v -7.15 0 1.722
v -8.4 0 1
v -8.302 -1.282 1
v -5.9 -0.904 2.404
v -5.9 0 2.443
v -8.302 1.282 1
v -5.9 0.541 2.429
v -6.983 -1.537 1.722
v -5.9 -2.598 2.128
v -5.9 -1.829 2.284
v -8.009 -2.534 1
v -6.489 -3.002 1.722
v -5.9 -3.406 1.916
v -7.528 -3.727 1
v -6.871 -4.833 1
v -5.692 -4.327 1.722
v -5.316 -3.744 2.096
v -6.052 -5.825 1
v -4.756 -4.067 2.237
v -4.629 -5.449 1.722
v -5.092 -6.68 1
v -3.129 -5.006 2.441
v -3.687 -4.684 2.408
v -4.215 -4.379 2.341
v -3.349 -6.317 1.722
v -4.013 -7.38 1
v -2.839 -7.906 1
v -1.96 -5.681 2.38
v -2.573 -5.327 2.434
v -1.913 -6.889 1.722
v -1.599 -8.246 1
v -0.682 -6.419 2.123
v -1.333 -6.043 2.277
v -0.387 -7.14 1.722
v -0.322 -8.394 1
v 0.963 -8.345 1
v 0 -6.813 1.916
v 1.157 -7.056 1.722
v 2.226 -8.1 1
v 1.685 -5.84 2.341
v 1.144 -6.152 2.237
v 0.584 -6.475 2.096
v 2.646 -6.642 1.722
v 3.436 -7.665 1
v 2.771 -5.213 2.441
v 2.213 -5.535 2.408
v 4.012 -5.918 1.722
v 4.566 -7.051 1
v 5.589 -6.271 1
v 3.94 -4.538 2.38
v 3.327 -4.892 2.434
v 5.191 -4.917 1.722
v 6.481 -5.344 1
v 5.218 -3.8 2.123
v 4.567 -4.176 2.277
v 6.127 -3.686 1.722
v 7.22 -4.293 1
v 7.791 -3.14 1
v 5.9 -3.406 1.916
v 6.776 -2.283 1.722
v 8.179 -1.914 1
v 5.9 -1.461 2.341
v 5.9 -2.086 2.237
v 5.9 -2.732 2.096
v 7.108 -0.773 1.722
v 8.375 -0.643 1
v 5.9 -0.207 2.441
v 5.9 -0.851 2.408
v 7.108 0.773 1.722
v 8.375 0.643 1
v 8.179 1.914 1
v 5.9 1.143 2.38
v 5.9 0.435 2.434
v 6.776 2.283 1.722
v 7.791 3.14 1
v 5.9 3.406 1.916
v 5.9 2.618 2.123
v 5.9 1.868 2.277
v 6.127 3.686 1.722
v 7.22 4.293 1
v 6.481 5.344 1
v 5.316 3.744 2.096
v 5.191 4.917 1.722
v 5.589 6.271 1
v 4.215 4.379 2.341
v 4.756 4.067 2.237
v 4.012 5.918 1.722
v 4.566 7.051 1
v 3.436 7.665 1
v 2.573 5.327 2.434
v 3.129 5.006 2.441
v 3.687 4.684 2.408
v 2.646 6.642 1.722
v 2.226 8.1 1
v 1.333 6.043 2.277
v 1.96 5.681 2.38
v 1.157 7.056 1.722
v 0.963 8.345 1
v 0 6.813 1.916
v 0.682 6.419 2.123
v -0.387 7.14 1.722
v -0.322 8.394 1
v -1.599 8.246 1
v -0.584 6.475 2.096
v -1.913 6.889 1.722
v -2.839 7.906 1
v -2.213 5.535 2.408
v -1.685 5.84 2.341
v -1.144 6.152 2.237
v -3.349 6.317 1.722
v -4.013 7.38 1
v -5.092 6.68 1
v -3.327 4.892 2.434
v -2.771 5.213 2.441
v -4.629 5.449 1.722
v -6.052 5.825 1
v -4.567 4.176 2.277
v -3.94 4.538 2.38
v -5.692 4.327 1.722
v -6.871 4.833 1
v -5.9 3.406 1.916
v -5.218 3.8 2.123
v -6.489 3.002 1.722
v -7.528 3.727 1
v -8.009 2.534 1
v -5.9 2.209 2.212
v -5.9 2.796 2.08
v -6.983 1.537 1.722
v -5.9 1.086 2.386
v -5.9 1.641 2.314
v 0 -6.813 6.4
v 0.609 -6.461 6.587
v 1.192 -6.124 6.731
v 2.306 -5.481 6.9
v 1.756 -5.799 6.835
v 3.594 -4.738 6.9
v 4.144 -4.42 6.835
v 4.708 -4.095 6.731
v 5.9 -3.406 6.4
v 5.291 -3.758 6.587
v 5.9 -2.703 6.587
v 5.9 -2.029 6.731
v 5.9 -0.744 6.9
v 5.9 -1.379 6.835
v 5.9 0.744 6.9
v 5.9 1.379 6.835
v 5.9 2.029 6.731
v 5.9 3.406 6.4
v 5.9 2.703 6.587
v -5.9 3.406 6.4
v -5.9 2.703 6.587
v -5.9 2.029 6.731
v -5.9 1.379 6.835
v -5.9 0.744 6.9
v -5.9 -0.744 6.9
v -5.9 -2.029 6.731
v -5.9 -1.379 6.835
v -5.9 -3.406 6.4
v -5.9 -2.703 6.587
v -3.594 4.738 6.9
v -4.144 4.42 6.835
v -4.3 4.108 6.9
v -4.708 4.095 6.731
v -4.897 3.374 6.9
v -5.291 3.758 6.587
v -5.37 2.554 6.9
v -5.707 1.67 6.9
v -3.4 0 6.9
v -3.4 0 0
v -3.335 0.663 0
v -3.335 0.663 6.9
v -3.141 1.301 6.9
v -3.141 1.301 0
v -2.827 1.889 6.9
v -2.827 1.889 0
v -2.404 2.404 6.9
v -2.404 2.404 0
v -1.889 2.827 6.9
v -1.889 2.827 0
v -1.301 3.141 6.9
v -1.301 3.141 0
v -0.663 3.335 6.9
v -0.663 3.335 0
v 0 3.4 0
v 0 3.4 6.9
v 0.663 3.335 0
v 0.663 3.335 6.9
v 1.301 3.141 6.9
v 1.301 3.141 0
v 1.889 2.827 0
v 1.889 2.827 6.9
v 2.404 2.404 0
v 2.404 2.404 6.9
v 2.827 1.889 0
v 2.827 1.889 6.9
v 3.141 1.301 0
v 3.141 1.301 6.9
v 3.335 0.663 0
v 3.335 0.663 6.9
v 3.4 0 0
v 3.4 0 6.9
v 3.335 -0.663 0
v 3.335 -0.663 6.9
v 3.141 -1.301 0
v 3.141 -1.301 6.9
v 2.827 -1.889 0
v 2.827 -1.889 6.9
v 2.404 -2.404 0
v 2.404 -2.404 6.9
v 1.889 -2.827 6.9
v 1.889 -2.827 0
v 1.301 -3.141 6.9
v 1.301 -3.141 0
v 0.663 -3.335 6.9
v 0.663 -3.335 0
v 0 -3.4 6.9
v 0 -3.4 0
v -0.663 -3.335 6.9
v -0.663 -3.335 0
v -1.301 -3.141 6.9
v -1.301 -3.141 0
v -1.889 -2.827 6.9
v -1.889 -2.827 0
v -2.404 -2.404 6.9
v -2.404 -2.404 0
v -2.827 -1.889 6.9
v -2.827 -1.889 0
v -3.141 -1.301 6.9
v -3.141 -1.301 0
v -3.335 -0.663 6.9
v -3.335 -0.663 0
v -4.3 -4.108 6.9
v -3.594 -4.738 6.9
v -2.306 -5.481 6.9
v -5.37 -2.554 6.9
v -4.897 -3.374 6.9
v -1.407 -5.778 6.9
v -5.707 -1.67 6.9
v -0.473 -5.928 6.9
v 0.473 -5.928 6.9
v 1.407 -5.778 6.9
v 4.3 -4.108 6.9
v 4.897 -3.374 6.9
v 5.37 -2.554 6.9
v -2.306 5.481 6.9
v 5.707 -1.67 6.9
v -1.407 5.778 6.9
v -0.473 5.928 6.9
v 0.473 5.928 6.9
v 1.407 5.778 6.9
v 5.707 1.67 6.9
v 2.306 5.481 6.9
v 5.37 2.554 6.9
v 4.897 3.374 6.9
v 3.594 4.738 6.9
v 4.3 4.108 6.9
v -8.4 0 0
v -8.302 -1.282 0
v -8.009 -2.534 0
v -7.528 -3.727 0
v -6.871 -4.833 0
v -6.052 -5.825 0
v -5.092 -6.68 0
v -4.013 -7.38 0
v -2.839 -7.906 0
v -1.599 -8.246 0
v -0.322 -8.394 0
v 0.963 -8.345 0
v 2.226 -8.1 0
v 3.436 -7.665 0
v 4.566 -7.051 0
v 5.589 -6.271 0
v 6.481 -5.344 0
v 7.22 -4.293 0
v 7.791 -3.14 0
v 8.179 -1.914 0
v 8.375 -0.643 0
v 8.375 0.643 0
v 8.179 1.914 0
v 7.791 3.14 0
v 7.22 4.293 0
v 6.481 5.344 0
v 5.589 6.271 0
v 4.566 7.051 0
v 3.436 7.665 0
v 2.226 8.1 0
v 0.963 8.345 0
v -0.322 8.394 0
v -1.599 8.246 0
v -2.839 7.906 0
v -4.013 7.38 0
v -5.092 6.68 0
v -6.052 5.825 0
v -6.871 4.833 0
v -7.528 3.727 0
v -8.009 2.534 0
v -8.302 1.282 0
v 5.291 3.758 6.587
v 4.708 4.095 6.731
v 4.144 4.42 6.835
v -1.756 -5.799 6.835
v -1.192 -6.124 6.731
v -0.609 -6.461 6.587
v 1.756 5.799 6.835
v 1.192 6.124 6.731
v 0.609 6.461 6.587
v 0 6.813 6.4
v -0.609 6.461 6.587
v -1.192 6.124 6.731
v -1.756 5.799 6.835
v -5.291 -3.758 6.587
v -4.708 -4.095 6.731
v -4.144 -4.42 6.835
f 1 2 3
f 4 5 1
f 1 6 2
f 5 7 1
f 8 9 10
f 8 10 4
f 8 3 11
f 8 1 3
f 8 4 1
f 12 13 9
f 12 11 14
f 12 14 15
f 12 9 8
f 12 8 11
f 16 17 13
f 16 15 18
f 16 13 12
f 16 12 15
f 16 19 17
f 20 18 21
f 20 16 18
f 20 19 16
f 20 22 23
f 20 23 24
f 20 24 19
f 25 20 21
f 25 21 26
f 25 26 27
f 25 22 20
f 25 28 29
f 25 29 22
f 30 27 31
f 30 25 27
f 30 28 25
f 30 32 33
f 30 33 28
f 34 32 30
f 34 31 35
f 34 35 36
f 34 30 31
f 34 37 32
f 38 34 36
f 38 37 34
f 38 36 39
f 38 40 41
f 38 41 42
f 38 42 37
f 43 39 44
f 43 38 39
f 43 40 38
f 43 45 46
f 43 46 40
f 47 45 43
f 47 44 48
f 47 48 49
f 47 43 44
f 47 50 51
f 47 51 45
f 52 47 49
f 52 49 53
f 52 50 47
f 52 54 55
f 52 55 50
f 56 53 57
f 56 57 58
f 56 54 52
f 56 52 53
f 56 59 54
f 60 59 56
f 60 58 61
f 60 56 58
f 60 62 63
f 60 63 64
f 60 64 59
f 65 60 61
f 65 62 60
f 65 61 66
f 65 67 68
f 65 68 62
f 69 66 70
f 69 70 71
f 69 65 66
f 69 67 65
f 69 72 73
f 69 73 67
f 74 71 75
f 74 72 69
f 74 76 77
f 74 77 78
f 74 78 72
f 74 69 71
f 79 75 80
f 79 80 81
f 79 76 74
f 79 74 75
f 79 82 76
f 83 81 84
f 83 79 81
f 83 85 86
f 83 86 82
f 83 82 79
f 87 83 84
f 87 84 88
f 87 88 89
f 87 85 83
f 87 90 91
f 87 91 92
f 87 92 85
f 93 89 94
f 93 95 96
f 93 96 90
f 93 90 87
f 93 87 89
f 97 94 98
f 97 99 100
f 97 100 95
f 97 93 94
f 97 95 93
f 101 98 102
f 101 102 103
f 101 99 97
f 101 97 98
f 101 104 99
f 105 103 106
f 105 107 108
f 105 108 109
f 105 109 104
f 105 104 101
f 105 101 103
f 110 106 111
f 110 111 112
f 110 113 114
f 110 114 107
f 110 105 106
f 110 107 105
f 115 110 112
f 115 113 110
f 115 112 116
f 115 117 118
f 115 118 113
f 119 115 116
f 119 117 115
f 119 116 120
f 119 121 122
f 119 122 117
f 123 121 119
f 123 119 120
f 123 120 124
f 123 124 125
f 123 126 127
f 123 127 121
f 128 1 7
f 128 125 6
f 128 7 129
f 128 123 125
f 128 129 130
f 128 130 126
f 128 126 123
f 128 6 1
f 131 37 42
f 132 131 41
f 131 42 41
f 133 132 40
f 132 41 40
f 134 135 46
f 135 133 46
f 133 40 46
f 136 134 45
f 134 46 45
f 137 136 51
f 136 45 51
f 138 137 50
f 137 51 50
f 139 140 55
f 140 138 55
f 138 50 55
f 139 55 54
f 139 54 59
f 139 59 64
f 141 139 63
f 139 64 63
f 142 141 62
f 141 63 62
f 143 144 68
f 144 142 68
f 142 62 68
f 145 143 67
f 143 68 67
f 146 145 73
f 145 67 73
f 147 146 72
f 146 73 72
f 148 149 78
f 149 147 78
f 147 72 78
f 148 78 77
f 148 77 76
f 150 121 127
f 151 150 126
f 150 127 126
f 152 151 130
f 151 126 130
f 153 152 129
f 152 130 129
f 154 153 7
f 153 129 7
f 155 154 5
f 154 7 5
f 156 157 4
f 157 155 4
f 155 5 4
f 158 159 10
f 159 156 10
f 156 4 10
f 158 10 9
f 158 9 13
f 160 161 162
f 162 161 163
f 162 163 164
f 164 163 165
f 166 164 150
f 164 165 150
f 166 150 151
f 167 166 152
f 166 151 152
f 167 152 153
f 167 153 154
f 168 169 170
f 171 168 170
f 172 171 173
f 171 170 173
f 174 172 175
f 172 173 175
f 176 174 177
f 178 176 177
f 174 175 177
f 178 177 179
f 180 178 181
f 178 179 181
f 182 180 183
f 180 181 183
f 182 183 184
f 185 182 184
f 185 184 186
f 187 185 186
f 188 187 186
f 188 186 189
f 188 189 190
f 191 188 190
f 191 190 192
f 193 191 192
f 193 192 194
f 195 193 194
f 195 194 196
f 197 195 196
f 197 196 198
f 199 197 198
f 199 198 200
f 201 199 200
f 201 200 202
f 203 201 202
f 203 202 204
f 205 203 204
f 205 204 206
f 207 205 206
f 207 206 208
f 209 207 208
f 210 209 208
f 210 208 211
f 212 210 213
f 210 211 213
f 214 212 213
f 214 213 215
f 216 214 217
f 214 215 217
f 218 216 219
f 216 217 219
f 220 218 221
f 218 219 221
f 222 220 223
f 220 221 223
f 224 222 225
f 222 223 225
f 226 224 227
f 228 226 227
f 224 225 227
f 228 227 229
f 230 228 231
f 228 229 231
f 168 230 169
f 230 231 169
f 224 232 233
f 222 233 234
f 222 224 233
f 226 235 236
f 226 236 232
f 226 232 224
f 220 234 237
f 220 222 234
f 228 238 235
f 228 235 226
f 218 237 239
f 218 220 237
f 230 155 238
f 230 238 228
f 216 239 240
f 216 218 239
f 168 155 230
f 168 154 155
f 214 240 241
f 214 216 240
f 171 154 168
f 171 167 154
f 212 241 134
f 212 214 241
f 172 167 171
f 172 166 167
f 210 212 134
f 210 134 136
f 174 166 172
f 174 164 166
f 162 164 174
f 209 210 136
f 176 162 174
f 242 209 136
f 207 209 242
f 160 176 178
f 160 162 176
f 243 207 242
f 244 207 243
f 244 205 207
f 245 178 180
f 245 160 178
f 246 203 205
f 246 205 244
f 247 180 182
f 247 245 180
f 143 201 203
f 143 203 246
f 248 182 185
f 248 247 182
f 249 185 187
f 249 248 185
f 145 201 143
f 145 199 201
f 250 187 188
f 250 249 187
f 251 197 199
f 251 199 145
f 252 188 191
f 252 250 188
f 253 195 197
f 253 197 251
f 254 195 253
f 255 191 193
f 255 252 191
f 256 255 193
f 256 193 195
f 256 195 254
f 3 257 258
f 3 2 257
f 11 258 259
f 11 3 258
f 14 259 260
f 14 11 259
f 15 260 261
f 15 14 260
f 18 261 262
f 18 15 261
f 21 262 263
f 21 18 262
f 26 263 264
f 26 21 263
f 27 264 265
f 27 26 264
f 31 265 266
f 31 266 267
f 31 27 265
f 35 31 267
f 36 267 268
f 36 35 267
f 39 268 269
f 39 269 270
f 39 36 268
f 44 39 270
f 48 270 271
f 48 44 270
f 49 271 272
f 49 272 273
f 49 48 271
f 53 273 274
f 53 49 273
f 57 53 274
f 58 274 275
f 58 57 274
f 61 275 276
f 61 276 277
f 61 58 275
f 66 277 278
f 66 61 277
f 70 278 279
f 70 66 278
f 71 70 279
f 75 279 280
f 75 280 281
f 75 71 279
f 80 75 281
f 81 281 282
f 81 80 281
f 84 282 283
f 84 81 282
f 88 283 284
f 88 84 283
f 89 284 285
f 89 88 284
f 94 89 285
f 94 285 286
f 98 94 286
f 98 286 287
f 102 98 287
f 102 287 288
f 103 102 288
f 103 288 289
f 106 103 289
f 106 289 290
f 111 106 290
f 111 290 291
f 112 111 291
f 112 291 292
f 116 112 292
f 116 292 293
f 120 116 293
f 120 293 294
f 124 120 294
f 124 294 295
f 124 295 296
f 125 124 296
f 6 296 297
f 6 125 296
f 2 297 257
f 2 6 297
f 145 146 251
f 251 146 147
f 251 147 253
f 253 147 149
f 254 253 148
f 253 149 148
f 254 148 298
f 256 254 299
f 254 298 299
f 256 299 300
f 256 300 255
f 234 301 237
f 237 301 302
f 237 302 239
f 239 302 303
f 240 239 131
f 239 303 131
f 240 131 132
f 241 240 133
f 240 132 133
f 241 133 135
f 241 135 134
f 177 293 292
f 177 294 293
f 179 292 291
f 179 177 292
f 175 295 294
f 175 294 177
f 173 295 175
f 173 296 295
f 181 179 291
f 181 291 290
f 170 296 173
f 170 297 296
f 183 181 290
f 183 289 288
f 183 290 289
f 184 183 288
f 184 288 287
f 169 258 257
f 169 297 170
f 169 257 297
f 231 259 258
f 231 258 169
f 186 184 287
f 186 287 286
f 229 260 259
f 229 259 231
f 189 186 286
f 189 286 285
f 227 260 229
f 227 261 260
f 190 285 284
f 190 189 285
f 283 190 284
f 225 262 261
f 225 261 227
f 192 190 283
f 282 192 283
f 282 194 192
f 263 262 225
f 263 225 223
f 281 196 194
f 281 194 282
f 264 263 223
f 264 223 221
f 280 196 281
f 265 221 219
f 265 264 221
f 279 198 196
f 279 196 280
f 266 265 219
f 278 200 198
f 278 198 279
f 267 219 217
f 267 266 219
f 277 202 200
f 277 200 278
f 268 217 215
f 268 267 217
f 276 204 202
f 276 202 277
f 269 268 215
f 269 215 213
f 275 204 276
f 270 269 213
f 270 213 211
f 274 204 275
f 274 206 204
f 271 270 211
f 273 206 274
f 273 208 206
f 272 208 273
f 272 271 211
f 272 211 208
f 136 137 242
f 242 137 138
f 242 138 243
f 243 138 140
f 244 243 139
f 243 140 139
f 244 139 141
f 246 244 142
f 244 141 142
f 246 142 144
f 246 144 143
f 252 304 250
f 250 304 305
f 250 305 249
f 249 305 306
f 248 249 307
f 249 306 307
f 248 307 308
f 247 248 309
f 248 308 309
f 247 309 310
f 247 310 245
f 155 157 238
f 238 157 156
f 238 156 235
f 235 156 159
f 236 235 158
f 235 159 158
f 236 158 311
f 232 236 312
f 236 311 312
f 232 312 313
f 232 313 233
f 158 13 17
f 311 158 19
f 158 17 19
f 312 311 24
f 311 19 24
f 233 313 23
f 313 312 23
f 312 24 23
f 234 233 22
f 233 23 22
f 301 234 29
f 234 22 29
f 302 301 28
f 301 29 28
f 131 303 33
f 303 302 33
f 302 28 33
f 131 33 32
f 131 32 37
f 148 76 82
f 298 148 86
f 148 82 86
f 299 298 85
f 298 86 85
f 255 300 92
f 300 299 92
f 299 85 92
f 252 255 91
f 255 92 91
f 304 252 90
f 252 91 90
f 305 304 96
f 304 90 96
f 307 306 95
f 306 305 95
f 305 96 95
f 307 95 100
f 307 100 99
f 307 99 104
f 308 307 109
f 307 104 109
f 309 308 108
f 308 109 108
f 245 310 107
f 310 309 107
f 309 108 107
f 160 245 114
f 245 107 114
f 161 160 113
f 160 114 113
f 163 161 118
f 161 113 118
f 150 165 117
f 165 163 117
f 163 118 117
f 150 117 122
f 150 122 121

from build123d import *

# Parameters (mm, degrees)
BOSS_EXTRU_1_DEPTH = 6.9
TROU_TARAUD_M81_D  = 6.8


with BuildPart() as part:
    # Esquisse1 → Boss.-Extru.1 (new body)
    with BuildSketch(Plane.XY):
        Polygon((-5.9, -3.406366588), (0, -6.812733176), (5.9, -3.406366588), (5.9, 3.406366588), (0, 6.812733176), (-5.9, 3.406366588), align=None)
    extrude(amount=BOSS_EXTRU_1_DEPTH)

    # Esquisse2 → Révolution1 (revolve)
    with BuildSketch(Plane(origin=(0, 0, 0), x_dir=(0, 0, -1), z_dir=(1, 0, 0)), mode=Mode.PRIVATE) as r_volution1_sk:
        Polygon((-1, 8.4), (-2.5, 5.801923789), (-2.5, 0), (0, 0), (0, 8.4), align=None)
    revolve(r_volution1_sk.sketch.rotate(Axis((0, 0, 0), (0, 0, 1)), 90), axis=Axis((0, 0, 0), (0, 0, 1)))

    # Esquisse3 → Enlèvement de matière-Révolution1 (revolve, cut)
    with BuildSketch(Plane(origin=(0, 0, 0), x_dir=(0, 0, -1), z_dir=(1, 0, 0))):
        Polygon((-6.9, 6.812733176), (-6.9, 5.946707773), (-6.4, 6.812733176), align=None)
    revolve(axis=Axis((0, 0, 0), (0, 0, 1)), mode=Mode.SUBTRACT)

    # Trou taraudé M81 (through all)
    with Locations(Plane.XY.offset(6.9)):
        with Locations((0, 0)):
            Hole(TROU_TARAUD_M81_D / 2)


solid = part.part
